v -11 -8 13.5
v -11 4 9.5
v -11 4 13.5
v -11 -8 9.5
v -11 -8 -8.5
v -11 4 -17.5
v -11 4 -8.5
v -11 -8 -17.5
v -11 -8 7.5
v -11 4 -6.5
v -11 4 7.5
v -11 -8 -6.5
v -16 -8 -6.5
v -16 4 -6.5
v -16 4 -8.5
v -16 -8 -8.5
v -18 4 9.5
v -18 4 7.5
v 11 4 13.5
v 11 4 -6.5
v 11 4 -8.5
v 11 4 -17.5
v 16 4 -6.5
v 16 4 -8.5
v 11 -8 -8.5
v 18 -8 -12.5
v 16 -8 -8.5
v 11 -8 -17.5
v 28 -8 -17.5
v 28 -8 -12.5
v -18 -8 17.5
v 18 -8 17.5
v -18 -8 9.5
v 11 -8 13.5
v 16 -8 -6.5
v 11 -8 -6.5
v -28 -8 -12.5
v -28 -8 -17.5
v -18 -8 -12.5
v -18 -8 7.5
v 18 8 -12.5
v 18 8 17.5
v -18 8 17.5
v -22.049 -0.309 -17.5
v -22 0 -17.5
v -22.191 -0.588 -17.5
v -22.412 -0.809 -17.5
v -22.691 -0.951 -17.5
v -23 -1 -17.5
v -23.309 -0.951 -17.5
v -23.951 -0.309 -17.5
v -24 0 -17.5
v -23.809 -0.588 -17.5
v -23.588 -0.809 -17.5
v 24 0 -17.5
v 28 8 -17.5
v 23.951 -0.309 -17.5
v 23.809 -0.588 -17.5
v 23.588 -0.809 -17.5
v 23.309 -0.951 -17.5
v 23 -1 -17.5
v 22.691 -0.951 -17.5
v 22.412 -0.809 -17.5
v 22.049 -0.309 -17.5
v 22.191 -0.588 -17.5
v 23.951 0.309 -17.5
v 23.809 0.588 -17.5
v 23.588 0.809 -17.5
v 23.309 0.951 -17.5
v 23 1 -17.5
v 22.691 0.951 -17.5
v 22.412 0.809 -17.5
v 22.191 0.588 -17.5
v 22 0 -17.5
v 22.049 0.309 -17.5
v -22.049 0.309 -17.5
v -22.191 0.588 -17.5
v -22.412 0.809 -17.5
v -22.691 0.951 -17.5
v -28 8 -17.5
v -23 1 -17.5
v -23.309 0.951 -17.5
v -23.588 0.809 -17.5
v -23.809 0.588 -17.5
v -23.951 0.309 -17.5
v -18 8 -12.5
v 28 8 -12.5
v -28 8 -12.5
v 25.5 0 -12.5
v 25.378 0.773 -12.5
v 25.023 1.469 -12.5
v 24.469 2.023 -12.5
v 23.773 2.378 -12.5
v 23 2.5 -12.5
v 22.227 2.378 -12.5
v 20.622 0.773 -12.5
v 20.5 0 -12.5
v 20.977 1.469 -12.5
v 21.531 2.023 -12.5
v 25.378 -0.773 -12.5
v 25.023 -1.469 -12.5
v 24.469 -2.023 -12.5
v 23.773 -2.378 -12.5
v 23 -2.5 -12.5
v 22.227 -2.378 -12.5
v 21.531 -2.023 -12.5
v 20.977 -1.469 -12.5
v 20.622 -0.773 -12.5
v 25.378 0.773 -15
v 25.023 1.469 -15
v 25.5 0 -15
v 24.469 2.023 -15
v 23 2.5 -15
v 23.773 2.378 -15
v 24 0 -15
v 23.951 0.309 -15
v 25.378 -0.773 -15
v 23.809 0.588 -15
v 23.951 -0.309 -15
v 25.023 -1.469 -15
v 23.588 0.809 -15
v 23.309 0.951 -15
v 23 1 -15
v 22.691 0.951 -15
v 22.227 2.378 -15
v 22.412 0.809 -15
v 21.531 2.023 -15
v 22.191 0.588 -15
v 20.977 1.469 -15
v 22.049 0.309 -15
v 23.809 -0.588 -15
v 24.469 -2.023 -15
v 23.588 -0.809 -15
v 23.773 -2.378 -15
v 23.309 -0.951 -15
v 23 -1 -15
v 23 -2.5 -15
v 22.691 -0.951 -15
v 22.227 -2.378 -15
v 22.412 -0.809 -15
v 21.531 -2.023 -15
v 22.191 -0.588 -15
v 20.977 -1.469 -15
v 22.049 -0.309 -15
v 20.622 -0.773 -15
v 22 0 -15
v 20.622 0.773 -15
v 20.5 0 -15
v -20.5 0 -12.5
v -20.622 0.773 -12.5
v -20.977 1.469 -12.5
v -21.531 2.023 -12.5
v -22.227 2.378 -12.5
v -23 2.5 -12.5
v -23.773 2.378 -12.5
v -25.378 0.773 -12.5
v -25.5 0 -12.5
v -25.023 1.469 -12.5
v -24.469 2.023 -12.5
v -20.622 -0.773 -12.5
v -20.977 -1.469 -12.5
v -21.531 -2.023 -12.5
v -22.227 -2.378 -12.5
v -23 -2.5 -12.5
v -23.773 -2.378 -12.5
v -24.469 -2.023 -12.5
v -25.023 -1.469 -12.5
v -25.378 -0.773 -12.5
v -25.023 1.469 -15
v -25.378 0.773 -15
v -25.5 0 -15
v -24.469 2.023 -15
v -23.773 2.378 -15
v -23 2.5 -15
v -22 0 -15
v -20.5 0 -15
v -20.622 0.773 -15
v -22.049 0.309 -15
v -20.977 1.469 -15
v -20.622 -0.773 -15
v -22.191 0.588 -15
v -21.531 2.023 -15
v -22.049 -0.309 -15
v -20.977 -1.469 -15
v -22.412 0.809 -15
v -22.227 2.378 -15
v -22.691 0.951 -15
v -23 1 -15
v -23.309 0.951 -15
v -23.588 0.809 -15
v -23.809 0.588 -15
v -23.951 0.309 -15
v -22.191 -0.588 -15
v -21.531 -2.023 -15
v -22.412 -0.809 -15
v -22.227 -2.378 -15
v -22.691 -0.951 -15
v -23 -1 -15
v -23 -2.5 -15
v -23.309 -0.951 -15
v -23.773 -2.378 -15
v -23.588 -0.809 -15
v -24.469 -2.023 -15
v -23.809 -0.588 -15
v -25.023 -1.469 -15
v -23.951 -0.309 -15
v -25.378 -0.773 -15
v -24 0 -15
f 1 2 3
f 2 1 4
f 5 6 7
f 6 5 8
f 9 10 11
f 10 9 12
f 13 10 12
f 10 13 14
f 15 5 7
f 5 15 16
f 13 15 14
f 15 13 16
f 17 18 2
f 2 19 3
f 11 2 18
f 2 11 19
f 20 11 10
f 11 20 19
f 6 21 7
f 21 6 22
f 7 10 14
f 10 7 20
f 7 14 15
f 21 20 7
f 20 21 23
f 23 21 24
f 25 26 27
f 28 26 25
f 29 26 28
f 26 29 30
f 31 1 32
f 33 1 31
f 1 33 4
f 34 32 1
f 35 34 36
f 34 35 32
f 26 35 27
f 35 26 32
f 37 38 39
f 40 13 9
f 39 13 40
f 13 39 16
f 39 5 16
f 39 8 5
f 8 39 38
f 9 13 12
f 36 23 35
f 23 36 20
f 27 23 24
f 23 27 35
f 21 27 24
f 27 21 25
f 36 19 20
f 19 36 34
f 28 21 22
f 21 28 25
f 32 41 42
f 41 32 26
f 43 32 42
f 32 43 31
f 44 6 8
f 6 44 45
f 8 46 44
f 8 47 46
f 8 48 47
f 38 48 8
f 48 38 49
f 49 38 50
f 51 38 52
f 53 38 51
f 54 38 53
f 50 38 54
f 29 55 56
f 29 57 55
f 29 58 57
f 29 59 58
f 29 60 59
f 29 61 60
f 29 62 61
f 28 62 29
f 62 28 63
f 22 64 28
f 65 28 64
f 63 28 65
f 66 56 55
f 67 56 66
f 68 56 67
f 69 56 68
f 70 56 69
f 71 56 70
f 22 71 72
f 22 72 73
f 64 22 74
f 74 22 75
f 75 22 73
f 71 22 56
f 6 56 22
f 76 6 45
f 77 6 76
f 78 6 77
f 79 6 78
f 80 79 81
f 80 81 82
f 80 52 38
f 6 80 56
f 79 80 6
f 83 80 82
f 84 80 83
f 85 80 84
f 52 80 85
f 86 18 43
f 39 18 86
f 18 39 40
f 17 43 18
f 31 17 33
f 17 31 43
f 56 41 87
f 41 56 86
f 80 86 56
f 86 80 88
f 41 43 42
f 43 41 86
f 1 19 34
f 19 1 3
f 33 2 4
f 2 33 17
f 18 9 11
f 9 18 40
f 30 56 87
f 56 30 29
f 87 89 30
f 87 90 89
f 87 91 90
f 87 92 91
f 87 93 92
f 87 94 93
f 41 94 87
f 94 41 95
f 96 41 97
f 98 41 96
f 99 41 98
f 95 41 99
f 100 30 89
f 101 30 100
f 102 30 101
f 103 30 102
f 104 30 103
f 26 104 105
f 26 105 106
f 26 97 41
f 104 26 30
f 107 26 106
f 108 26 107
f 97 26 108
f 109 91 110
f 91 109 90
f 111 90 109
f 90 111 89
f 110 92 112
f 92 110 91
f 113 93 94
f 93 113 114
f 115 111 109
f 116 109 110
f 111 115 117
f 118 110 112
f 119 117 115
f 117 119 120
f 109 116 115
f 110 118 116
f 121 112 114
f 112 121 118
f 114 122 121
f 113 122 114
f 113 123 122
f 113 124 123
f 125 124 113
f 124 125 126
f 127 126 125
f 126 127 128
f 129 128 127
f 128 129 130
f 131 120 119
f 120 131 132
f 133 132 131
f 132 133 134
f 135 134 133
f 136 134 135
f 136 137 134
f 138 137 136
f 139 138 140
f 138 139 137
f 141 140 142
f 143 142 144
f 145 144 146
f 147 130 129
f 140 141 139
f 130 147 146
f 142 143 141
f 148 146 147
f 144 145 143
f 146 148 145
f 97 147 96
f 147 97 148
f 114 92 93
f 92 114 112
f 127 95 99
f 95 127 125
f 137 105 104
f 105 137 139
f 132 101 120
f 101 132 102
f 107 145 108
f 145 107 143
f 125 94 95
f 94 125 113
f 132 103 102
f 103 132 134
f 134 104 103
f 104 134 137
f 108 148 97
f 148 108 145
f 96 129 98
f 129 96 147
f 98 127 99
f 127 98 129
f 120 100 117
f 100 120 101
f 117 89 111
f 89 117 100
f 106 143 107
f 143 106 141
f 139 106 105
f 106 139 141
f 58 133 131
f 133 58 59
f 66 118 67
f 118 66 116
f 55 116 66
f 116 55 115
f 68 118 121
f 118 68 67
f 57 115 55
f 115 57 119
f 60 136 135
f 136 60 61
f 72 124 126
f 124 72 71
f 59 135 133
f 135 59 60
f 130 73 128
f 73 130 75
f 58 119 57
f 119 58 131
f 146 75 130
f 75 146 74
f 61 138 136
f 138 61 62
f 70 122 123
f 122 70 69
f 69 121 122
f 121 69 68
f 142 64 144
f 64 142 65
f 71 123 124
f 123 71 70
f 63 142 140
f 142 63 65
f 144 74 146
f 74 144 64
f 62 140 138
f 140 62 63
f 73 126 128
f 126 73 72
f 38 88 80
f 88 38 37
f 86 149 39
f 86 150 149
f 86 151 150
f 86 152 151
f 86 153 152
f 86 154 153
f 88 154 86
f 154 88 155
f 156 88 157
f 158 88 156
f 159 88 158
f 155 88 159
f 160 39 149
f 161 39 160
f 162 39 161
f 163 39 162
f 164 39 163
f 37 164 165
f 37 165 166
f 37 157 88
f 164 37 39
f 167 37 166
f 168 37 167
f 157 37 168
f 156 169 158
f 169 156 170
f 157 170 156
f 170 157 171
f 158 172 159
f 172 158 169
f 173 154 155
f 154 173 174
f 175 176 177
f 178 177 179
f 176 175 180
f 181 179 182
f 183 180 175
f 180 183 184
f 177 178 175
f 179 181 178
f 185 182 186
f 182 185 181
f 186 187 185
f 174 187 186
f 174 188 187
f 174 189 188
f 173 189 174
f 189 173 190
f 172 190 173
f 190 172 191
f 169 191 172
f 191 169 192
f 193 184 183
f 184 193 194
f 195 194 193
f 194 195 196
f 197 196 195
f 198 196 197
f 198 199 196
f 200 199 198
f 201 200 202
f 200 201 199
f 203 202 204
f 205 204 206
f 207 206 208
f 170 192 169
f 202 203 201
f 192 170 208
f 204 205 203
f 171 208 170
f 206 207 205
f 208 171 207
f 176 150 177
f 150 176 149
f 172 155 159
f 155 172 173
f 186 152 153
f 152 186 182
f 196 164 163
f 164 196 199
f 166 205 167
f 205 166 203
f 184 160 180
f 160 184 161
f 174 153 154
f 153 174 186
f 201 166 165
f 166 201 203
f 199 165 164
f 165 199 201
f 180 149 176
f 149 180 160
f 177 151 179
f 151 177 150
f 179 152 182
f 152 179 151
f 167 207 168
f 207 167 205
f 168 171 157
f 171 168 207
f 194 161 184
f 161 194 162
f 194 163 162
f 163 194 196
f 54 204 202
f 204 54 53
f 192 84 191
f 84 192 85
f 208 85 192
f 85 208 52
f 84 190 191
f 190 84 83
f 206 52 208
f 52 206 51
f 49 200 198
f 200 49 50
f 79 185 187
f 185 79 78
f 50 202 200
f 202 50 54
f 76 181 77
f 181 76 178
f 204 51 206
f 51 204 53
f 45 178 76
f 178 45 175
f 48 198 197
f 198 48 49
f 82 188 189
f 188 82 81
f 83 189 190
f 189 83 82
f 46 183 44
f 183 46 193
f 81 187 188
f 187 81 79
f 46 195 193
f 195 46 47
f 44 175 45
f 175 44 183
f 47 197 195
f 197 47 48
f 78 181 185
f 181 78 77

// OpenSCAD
// servo holder

servoHeight = 31;
servoWidth = 22;
servoDepth = 12;

clipHeightPos = 11;


clipHeight = 2;
clipWidth = 5;
clipDepth = 2;

wireHeight = 31 - 4;

thickness = 7;
thicknessLess = 4;
thicknessTop = 4;

screwShaft = 2;
screwHead = 5;

difference(){

	

	cube([servoWidth+(2*thickness), servoDepth+thicknessLess, servoHeight+thicknessTop], center=true);
	

	translate([0,-thicknessLess/2,-thicknessTop/2]){
		cube([servoWidth, servoDepth, servoHeight], center=true);
	}
	
	for (i = [0, 1]){
		mirror([ i, 0, 0 ]){		
			translate([-(servoWidth+clipWidth)/2,-(thicknessLess)/2, -((servoHeight+thicknessTop)/2) + clipHeightPos - clipHeight/2]){
				cube([clipWidth, servoDepth, clipHeight], center=true);
			}
		}
	}

	translate([-(servoWidth+clipWidth)/2,-(thicknessLess)/2, -((servoHeight+thicknessTop)/2) + wireHeight - clipHeight/2]){
				cube([clipWidth*2, servoDepth, clipHeight], center=true);
			}

}

for (i = [0, 1]){

	mirror([ i, 0, 0 ]){


		translate([5 +thickness + servoWidth/2,0,2.5-(servoHeight+thicknessTop)/2]){
	
			difference(){
				cube([10,servoDepth+thicknessLess,5], center=true);


				translate([0,0,+5/2]){
					cylinder(h=5, r=screwHead/2, $fn=20, center=true);
				}

				translate([0,0,-5/2]){
					cylinder(h=5, r=screwShaft/2, $fn=20, center=true);
				}


			}
	
		}
	}
}
